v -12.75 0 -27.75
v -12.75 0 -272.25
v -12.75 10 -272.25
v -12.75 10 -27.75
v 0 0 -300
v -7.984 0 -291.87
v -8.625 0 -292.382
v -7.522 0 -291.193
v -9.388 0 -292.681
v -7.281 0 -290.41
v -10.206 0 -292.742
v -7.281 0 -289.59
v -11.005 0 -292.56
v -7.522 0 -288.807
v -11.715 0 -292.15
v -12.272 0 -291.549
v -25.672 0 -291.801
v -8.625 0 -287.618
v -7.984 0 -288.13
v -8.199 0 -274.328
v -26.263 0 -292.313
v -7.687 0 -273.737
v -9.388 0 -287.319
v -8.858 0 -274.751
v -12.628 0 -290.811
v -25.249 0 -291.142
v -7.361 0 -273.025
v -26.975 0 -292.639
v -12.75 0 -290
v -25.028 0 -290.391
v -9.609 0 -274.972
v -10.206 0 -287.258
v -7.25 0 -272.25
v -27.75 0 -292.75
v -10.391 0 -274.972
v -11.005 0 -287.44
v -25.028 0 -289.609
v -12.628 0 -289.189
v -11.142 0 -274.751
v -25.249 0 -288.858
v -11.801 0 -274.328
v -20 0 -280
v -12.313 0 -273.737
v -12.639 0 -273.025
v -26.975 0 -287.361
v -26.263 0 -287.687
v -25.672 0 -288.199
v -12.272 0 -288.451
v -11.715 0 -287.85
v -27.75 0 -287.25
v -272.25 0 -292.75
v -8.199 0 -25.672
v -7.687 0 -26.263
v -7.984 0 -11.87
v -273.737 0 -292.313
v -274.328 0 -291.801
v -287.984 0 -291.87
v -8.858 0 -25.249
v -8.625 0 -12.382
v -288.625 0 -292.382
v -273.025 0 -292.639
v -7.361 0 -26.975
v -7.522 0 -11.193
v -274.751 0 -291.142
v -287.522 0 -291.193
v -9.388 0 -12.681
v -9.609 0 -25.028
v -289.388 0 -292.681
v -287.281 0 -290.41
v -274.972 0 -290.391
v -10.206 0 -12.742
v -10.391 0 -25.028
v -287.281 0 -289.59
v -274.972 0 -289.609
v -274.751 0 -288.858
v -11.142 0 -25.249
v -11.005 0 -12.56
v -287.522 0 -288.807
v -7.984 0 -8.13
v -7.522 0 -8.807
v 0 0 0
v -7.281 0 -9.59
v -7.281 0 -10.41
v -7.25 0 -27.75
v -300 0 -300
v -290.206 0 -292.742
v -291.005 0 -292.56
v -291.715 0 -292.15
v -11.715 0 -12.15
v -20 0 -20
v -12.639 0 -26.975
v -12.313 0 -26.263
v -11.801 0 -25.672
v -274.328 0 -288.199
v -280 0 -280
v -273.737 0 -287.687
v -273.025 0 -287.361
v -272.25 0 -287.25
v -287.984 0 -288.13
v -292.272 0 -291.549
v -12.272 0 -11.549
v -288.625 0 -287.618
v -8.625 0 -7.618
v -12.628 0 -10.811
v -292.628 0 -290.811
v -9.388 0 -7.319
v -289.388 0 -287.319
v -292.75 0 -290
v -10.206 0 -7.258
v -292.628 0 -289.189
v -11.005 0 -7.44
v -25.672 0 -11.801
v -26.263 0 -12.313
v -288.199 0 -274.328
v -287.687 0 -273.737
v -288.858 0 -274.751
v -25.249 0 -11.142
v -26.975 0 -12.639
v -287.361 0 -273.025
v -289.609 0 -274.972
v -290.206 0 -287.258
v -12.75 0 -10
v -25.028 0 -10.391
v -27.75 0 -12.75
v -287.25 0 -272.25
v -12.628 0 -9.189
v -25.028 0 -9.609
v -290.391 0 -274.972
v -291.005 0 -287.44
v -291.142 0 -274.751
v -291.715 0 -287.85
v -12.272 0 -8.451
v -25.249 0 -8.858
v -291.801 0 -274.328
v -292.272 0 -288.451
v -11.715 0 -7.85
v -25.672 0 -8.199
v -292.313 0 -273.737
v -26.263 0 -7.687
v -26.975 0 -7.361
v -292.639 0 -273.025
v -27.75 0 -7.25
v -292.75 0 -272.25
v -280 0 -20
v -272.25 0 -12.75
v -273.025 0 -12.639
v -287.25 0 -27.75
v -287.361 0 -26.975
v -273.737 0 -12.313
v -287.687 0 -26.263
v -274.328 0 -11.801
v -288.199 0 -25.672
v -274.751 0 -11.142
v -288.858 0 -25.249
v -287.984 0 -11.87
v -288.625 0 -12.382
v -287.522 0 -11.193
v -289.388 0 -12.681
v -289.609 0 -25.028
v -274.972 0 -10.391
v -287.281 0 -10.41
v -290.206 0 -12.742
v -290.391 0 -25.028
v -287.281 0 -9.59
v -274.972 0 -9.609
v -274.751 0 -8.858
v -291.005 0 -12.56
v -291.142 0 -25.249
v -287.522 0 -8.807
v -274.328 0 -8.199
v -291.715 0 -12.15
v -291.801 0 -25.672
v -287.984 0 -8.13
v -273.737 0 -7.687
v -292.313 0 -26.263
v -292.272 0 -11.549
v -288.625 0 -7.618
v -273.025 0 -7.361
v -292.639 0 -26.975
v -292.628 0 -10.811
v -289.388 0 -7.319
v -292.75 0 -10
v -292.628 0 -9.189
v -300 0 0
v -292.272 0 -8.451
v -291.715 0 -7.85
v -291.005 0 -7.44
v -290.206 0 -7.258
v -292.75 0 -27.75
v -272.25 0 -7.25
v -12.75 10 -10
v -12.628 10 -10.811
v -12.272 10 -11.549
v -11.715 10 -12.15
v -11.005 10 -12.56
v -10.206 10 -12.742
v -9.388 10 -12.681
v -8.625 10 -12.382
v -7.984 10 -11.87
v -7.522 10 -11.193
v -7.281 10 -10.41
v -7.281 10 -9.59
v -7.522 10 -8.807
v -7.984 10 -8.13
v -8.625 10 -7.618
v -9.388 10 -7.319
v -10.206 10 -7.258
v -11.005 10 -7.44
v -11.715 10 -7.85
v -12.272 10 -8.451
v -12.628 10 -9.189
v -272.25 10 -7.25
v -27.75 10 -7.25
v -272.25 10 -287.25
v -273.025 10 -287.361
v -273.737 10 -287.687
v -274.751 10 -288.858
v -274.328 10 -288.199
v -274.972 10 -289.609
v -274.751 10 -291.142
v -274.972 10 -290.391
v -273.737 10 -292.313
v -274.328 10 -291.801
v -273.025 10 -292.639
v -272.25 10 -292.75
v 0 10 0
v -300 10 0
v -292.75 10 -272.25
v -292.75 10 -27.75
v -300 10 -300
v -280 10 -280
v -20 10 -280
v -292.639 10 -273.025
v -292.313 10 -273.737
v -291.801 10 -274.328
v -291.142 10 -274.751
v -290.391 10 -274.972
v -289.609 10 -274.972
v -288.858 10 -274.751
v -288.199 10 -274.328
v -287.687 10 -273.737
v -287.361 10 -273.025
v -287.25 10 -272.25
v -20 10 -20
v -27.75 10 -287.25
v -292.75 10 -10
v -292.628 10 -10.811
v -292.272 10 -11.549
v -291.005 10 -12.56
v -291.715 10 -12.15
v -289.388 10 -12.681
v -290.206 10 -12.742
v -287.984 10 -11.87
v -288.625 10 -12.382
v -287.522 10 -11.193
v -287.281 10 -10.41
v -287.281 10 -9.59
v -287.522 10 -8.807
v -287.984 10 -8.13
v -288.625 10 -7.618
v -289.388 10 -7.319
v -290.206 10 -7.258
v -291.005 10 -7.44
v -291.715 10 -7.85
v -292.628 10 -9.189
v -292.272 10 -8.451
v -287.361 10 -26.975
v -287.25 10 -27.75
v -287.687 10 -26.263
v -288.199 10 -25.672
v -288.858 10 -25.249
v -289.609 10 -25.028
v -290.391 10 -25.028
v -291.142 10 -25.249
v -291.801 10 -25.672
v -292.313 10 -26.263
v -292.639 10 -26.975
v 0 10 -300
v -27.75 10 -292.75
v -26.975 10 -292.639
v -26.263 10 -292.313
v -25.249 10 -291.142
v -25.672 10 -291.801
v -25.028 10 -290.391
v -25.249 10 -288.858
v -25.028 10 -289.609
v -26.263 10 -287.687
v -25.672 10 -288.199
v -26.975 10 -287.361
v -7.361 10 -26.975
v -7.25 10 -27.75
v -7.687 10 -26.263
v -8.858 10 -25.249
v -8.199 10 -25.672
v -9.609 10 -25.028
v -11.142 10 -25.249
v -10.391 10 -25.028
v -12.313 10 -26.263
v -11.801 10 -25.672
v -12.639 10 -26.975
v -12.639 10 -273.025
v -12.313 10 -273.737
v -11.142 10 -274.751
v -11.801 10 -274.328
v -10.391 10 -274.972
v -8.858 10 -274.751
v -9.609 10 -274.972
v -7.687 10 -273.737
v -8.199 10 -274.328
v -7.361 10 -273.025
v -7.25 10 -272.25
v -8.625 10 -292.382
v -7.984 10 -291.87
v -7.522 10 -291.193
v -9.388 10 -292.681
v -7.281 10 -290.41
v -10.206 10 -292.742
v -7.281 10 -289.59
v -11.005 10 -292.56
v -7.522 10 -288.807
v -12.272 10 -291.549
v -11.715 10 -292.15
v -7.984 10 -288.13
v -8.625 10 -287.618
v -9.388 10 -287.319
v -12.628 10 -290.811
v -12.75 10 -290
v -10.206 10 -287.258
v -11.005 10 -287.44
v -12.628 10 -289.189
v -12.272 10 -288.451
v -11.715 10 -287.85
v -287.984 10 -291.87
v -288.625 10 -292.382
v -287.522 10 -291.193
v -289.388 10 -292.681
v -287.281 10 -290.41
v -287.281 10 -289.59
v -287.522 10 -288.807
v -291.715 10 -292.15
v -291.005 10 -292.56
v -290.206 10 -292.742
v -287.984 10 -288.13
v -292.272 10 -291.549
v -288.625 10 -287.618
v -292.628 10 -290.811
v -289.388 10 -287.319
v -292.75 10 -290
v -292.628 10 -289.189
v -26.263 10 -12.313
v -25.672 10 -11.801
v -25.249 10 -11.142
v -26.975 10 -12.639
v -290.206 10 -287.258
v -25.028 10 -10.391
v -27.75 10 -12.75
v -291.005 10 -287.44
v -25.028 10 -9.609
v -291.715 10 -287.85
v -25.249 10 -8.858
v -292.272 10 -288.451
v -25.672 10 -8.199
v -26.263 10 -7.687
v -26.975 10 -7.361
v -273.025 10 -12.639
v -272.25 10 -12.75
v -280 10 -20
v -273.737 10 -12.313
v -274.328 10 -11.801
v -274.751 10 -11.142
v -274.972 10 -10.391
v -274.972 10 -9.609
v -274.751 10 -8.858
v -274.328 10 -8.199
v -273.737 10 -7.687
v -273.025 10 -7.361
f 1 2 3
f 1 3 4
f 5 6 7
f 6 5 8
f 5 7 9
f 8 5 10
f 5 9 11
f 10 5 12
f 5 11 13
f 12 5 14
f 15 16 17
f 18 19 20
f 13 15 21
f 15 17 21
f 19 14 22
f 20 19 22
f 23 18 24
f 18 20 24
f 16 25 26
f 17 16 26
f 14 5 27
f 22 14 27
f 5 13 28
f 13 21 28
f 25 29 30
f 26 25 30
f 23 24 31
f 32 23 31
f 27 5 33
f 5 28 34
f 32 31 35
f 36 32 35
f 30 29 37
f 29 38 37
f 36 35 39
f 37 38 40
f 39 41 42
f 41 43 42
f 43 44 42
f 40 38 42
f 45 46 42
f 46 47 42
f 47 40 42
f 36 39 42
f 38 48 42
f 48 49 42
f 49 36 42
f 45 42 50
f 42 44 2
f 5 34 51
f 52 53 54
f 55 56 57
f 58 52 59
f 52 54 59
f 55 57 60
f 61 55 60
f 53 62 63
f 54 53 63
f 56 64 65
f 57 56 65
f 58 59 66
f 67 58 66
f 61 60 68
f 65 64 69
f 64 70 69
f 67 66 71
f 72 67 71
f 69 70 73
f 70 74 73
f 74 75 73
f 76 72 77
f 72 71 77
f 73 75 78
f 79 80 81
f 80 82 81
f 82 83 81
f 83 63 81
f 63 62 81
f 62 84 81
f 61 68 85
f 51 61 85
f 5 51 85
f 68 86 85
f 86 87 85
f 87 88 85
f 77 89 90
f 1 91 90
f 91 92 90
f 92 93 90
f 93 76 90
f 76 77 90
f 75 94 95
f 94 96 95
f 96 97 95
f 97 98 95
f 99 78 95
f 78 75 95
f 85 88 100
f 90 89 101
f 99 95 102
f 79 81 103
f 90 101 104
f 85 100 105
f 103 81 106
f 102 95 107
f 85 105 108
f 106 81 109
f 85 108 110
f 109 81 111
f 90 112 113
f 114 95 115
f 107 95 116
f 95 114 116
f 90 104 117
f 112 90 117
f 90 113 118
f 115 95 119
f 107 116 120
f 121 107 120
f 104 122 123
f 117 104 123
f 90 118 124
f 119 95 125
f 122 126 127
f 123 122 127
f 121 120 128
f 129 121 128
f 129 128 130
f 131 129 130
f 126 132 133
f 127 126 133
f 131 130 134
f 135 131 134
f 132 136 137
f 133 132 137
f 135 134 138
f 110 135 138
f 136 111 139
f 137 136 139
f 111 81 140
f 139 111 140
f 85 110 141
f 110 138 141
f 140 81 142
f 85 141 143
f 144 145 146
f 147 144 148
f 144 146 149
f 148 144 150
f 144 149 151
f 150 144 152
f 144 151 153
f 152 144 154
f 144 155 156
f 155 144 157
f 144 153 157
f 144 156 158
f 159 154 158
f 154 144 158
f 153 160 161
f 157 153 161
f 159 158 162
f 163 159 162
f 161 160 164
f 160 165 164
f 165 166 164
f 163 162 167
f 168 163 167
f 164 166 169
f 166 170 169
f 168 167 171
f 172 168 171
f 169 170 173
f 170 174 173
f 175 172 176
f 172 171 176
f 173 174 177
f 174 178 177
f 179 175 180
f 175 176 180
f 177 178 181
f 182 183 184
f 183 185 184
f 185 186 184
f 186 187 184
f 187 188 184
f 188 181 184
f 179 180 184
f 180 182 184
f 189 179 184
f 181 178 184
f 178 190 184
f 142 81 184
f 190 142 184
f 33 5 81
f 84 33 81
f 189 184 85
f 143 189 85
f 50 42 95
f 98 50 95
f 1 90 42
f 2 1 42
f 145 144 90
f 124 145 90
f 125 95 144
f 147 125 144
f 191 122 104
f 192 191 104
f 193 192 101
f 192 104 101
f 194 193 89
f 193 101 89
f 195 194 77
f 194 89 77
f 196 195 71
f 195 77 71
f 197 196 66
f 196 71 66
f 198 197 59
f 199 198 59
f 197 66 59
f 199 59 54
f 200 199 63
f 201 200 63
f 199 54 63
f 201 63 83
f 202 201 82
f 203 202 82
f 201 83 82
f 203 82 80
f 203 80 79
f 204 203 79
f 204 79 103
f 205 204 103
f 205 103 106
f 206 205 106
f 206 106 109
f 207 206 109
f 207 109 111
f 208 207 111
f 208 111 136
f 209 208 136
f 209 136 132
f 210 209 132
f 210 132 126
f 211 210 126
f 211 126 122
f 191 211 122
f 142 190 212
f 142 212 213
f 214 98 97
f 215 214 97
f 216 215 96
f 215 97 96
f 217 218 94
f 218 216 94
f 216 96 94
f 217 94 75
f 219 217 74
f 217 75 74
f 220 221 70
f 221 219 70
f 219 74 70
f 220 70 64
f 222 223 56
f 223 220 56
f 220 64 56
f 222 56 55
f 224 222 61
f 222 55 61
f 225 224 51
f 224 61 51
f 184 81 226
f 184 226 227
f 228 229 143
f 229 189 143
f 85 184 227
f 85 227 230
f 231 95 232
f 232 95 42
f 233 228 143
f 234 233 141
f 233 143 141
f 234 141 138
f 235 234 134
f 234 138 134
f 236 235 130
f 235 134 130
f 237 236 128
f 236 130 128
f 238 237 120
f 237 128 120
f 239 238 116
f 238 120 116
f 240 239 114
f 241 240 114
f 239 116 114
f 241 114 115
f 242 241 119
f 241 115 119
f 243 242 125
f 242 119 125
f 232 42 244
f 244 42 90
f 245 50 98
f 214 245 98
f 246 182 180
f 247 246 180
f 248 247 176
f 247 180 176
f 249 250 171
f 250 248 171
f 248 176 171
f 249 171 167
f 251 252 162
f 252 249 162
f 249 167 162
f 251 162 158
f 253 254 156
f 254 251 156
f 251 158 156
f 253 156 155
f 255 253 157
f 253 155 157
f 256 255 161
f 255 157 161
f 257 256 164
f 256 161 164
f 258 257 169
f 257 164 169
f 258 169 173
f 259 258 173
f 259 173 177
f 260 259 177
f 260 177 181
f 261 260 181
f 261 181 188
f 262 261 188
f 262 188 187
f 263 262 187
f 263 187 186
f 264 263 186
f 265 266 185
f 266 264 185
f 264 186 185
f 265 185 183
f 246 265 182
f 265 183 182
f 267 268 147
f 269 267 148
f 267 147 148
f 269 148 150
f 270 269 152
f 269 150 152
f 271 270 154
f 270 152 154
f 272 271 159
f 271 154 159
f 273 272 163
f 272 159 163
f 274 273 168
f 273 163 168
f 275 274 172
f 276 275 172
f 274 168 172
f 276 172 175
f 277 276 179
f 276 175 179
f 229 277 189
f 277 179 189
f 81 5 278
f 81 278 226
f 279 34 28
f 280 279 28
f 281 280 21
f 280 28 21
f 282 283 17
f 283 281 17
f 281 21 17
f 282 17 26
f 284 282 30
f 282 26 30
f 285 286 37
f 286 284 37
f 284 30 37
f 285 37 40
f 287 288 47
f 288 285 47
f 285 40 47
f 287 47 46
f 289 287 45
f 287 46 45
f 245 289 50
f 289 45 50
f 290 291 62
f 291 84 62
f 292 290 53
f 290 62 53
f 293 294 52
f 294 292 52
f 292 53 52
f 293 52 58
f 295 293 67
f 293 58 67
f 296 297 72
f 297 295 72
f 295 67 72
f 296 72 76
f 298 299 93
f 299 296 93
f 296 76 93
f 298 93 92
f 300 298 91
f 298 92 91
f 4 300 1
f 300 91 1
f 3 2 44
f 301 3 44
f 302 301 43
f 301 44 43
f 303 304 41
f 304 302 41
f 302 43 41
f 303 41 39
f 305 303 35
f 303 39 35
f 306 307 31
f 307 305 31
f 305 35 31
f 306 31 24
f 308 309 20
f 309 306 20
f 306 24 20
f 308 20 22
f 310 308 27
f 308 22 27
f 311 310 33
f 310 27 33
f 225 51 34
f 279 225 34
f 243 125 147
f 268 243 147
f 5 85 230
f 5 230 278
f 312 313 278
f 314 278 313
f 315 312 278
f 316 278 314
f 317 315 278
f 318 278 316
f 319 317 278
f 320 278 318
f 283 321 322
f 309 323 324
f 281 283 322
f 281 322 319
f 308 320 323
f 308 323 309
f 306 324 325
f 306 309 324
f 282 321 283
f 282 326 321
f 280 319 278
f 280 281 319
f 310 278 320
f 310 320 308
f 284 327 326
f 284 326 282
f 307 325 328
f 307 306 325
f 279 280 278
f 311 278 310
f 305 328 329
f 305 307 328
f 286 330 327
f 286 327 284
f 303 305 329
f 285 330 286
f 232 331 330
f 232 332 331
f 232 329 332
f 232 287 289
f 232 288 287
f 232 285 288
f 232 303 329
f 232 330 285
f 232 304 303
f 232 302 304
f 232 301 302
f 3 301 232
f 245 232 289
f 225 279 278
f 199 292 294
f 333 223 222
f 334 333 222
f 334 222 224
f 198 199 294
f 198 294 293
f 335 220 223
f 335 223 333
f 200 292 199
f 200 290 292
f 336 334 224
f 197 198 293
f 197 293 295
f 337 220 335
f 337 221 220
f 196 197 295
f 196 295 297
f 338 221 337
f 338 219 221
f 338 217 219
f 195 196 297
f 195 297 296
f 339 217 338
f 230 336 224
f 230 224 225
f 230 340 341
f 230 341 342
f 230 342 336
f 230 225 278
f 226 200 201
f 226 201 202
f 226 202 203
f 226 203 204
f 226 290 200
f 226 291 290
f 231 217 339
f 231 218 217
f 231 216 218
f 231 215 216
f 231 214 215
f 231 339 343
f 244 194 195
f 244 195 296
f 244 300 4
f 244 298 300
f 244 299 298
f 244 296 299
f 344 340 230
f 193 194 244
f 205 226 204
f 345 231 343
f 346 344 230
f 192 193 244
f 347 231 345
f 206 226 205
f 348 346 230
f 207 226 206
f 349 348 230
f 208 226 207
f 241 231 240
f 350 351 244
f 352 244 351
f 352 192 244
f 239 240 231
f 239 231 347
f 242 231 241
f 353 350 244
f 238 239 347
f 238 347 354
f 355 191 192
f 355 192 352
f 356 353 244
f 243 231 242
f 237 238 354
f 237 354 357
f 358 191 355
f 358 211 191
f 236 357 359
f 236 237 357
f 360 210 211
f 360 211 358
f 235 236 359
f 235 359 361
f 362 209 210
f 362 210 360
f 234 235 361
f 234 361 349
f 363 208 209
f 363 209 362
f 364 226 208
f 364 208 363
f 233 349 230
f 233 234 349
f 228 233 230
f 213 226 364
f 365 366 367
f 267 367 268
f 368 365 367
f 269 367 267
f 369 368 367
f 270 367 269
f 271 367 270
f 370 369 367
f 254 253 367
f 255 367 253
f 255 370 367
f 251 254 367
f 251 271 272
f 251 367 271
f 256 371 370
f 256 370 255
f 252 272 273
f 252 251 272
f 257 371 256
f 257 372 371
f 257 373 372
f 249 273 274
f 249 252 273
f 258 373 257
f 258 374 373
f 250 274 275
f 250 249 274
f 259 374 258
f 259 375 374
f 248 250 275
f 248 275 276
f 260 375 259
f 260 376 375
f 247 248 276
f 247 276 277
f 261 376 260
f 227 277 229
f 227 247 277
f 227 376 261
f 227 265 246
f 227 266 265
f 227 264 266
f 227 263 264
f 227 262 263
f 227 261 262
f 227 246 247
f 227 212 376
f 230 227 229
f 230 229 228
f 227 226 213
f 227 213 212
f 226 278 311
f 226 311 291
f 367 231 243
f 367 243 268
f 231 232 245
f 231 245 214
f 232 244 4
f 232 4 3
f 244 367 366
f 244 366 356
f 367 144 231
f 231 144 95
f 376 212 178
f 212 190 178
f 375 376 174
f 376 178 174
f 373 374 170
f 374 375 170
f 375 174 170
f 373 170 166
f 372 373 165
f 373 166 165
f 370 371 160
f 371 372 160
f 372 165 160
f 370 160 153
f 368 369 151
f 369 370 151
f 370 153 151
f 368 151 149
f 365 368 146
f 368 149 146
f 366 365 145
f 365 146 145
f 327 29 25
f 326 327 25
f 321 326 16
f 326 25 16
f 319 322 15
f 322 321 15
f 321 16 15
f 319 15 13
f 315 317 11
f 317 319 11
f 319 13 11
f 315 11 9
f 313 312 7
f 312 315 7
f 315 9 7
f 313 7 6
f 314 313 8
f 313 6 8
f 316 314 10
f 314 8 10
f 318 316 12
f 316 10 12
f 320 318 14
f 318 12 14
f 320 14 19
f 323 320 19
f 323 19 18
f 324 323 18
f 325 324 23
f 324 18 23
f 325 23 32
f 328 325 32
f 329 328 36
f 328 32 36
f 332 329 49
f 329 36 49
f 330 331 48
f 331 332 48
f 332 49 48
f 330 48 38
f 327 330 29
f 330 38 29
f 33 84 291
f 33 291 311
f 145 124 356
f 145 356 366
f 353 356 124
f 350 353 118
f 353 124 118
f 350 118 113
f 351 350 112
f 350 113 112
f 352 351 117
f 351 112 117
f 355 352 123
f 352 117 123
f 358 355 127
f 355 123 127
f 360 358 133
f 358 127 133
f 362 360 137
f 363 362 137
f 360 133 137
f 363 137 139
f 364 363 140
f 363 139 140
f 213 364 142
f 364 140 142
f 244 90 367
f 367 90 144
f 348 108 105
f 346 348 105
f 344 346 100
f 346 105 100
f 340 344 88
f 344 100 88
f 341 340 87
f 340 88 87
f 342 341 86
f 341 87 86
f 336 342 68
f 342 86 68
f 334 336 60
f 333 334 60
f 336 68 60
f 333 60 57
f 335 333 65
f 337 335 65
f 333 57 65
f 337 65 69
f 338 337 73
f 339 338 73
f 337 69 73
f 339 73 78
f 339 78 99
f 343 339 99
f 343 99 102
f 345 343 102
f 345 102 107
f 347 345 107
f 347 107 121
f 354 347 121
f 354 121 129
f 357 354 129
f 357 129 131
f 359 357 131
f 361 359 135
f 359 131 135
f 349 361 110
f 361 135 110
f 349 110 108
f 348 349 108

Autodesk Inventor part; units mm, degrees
ref_plane "YZ Plane" through (0, 0, 0) normal (1, 0, 0) x (0, 1, 0)
ref_plane "XZ Plane" through (0, 0, 0) normal (0, 1, 0) x (-1, 0, 0)
ref_plane "XY Plane" through (0, 0, 0) normal (0, 0, 1) x (1, 0, 0)
sketch "Sketch1" plane through (0, 0, 0) normal (0, 1, 0) x (-1, 0, 0)
  line L0 (0, 0) -> (300, 0)
  line L1 (300, 0) -> (300, -300)
  line L2 (300, -300) -> (0, -300)
  line L3 (0, -300) -> (0, 0)
  line L4 (20, -20) -> (280, -20)
  line L5 (280, -20) -> (280, -280)
  line L6 (280, -280) -> (20, -280)
  line L7 (20, -280) -> (20, -20)
  line L8 (150, 0) -> (150, -333.0511)
  line L9 (300, -150) -> (0, -150)
  line L10 (290, -23.4629) -> (290, -392.3608)
  line L11 (268.156, -10) -> (-9.9722, -10)
  line L12 (290, -27.75) -> (290, -272.25) construction
  line L13 (292.75, -27.75) -> (292.75, -272.25)
  line L14 (287.25, -272.25) -> (287.25, -27.75)
  arc A0 (292.75, -27.75) -> (287.25, -27.75) centre (290, -27.75) ccw
  arc A1 (287.25, -272.25) -> (292.75, -272.25) centre (290, -272.25) ccw
  line L15 (7.25, -27.75) -> (7.25, -272.25)
  line L16 (12.75, -272.25) -> (12.75, -27.75)
  arc A2 (12.75, -27.75) -> (7.25, -27.75) centre (10, -27.75) ccw
  arc A3 (7.25, -272.25) -> (12.75, -272.25) centre (10, -272.25) ccw
  line L17 (27.75, -10) -> (272.25, -10) construction
  line L18 (27.75, -12.75) -> (272.25, -12.75)
  line L19 (272.25, -7.25) -> (27.75, -7.25)
  arc A4 (27.75, -7.25) -> (27.75, -12.75) centre (27.75, -10) ccw
  arc A5 (272.25, -12.75) -> (272.25, -7.25) centre (272.25, -10) ccw
  line L20 (27.75, -287.25) -> (272.25, -287.25)
  line L21 (272.25, -292.75) -> (27.75, -292.75)
  arc A6 (27.75, -287.25) -> (27.75, -292.75) centre (27.75, -290) ccw
  arc A7 (272.25, -292.75) -> (272.25, -287.25) centre (272.25, -290) ccw
  line L22 (280, -280) -> (300, -300)
  circle A8 centre (290, -290) radius 2.75
  circle A9 centre (10, -290) radius 2.75
  circle A10 centre (290, -10) radius 2.75
  circle A11 centre (10, -10) radius 2.75
  point P0 (150, -20)
  point P1 (290, -150)
  point P2 (290, -25)
  point P3 (290, -275)
  point P4 (150, -10)
  point P5 (25, -10)
  point P6 (275, -10)
  point P7 (275, -290)
  dimension "d0" = 300
  dimension "d1" = 300
  dimension "d2" = 20
  dimension "d3" = 20
  dimension "d4" = 20
  dimension "d5" = 20
  dimension "d6" = 20
  dimension "d7" = 20
  dimension "d8" = 5.5
  dimension "d9" = 250
  dimension "d10" = 5.5
  dimension "d11" = 250
  dimension "d12" = 5.5
  dimension "d15" = 280
extrude "Extrusion1" add sketch "Sketch1" along normal blind 10 contours L0 L8 L19 A4 L11 A11 L3 | L0 L1 L9 L13 A0 L14 L5 L4 L8 L18 A5 L19 | L11 A11 A4 L18 L8 L4 L7 L9 L16 A2 L15 L3 | L9 L15 A3 L16 L7 L6 L8 L20 A6 L21 L2 L3 | L1 L22 A8 L10 A1 L13 L9 | L2 L10 A8 L22 | L8 L21 A7 L20 L6 L22 A8 L10 L2 | L14 A1 L10 A8 L22 L5 L9
properties part number "XYbase" material "Wood (Birch)"
